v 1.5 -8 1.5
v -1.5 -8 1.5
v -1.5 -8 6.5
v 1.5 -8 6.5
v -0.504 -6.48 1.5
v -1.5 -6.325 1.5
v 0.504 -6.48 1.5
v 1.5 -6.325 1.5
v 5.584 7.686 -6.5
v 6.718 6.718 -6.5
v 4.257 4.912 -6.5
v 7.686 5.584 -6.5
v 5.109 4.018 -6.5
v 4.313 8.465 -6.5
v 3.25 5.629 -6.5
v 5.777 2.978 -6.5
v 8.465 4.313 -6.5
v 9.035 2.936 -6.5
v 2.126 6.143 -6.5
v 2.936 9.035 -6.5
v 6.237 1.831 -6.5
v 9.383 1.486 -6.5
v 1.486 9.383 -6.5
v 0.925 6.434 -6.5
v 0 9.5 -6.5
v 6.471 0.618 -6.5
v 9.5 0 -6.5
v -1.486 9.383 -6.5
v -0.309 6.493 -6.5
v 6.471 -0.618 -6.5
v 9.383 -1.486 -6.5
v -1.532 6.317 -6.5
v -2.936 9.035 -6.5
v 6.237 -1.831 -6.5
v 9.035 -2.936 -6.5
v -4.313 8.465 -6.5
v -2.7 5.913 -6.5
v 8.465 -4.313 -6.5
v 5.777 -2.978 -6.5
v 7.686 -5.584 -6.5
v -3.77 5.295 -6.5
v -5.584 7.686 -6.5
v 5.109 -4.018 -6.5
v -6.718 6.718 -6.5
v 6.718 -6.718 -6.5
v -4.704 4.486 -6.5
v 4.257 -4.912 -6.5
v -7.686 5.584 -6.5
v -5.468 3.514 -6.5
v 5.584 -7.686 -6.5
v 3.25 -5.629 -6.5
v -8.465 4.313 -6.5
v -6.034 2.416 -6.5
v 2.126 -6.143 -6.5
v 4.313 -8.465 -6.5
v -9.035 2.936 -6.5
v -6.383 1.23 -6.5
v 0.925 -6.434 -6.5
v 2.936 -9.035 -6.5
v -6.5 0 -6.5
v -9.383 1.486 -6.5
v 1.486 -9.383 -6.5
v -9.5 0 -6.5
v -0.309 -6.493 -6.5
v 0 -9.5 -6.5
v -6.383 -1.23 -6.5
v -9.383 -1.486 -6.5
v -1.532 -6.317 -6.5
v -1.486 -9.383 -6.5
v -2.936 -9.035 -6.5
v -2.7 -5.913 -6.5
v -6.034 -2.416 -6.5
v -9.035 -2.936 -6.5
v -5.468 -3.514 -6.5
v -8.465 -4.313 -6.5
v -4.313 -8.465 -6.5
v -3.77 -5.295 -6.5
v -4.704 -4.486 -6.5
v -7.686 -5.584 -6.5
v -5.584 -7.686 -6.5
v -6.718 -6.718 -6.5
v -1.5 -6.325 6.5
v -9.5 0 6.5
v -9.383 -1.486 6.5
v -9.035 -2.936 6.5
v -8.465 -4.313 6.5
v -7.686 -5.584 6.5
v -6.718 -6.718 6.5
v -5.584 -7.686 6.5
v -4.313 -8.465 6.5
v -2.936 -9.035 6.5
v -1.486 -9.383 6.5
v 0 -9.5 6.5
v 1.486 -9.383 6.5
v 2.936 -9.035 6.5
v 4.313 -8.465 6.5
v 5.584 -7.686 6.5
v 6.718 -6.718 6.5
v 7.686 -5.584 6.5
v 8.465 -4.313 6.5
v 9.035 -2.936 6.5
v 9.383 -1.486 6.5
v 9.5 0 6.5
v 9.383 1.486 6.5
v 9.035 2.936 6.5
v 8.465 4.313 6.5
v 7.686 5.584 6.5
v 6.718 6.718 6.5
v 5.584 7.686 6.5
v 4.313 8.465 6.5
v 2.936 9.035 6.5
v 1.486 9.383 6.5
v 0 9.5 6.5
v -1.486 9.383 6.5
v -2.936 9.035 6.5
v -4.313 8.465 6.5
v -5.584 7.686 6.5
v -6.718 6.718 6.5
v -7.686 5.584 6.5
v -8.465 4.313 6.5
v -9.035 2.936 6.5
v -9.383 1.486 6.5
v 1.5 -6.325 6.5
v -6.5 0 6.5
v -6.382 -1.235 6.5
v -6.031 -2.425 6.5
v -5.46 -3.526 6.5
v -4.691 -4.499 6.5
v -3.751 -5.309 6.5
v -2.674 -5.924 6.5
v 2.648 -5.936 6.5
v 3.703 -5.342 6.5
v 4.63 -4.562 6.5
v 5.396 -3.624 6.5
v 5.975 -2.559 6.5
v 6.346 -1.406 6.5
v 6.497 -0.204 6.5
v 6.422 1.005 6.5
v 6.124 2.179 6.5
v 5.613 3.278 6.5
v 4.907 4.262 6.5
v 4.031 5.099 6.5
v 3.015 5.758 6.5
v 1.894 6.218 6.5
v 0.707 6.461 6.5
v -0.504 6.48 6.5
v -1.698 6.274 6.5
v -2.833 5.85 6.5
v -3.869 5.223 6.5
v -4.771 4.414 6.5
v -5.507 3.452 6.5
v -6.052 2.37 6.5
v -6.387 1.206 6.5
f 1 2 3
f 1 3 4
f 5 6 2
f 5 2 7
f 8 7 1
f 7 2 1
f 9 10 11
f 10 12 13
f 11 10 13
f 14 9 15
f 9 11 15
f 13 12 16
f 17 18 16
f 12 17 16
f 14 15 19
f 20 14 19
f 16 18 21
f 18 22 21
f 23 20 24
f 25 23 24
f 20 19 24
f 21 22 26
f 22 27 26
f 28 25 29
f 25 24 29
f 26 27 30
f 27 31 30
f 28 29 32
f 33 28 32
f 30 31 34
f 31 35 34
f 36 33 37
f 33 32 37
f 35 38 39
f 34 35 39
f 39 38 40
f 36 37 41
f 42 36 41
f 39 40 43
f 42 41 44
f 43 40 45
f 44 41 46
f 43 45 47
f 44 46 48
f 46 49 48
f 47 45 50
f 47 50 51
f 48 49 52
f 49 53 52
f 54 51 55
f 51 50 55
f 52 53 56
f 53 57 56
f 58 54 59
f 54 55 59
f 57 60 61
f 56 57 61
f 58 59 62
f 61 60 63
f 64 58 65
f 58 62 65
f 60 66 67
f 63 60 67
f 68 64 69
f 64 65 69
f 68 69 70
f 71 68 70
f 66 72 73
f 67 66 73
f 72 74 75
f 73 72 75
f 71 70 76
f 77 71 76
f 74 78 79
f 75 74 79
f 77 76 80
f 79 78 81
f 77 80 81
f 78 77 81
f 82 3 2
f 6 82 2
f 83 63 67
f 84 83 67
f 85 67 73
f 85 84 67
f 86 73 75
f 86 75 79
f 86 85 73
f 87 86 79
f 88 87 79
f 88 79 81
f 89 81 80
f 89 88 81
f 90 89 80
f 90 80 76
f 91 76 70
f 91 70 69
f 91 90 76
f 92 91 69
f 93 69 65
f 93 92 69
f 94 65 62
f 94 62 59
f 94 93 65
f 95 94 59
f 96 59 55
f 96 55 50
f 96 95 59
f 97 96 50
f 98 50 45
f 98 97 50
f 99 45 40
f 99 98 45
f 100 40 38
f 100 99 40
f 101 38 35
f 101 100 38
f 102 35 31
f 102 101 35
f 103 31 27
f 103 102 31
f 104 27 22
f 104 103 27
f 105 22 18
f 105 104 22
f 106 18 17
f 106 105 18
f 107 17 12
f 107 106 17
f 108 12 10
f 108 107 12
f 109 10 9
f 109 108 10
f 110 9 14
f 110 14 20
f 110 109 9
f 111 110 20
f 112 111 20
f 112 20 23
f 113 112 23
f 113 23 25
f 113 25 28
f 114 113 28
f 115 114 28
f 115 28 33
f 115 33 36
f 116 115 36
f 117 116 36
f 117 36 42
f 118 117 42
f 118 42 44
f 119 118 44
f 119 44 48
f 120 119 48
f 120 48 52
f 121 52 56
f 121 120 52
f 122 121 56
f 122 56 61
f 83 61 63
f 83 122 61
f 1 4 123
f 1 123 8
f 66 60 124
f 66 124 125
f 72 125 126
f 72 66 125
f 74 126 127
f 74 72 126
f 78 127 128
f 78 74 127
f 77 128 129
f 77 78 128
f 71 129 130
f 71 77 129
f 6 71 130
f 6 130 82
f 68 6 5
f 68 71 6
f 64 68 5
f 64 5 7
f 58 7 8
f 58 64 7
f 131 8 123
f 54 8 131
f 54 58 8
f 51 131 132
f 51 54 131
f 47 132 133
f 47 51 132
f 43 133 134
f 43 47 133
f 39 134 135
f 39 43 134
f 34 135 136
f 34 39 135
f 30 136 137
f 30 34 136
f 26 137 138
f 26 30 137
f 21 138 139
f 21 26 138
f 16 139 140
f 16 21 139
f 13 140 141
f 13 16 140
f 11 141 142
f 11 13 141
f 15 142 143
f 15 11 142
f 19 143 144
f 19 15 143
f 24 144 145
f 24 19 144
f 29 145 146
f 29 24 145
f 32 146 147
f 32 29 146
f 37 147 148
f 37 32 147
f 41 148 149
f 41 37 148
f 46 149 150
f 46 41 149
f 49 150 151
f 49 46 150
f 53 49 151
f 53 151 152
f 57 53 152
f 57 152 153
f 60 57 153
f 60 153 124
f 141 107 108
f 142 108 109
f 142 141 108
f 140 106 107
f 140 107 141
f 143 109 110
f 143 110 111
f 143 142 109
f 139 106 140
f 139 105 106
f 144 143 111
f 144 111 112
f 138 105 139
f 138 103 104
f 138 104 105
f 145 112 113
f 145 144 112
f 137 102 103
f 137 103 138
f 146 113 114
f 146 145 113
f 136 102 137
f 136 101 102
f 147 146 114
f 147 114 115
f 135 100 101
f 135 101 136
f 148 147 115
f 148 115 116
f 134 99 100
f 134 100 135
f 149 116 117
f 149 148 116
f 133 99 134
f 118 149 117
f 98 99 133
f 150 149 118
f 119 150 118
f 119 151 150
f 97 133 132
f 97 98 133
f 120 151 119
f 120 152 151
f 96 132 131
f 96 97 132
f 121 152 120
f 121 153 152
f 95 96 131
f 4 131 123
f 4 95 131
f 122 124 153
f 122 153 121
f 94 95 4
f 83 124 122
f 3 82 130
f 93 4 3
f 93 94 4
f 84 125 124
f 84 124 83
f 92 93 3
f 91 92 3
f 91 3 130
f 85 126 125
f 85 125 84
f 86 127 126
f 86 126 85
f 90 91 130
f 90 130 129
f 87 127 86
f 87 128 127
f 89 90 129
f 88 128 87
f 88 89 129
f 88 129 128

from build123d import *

# Parameters (mm, degrees)
SKETCH1_R               = 9.5
SKETCH1_R_2             = 6.5
BOSS_EXTRUDE1_DEPTH     = 6.5
CUT_EXTRUDE1_REACH      = 24.925
CUT_EXTRUDE1_END_RADIUS = 6.5
CUT_EXTRUDE1_START      = -8
SKETCH2_W               = 3
SKETCH2_H               = 5


with BuildPart() as part:
    # Sketch1 → Boss-Extrude1 (new, symmetric)
    with BuildSketch(Plane.XY):
        with Locations(Location((0, 0, 0), (0, 0, 180))):
            Circle(SKETCH1_R)
        with Locations(Location((0, 0, 0), (0, 0, 180))):
            Circle(SKETCH1_R_2, mode=Mode.SUBTRACT)
    extrude(amount=BOSS_EXTRUDE1_DEPTH, both=True)

    # Cut-Extrude1: up to this cylinder (the profile starts outside it)
    cut_extrude1_end = Plane(origin=(0, 0, 4), z_dir=(0, 0, -1)) * Cylinder(CUT_EXTRUDE1_END_RADIUS, 63.85, mode=Mode.PRIVATE)
    # Sketch2 → Cut-Extrude1 (cut, up to the surface)
    with BuildSketch(Plane(origin=(0, 0, 0), x_dir=(1, 0, 0), z_dir=(0, 1, 0)).offset(CUT_EXTRUDE1_START), mode=Mode.PRIVATE) as cut_extrude1_sk1:
        with Locations((0, -4)):
            Rectangle(SKETCH2_W, SKETCH2_H)
    cut_extrude1_tool1 = extrude(cut_extrude1_sk1.sketch, amount=CUT_EXTRUDE1_REACH, mode=Mode.PRIVATE) - cut_extrude1_end
    add(cut_extrude1_tool1.solids().sort_by_distance((0, -8, 4))[0], mode=Mode.SUBTRACT)


solid = part.part
